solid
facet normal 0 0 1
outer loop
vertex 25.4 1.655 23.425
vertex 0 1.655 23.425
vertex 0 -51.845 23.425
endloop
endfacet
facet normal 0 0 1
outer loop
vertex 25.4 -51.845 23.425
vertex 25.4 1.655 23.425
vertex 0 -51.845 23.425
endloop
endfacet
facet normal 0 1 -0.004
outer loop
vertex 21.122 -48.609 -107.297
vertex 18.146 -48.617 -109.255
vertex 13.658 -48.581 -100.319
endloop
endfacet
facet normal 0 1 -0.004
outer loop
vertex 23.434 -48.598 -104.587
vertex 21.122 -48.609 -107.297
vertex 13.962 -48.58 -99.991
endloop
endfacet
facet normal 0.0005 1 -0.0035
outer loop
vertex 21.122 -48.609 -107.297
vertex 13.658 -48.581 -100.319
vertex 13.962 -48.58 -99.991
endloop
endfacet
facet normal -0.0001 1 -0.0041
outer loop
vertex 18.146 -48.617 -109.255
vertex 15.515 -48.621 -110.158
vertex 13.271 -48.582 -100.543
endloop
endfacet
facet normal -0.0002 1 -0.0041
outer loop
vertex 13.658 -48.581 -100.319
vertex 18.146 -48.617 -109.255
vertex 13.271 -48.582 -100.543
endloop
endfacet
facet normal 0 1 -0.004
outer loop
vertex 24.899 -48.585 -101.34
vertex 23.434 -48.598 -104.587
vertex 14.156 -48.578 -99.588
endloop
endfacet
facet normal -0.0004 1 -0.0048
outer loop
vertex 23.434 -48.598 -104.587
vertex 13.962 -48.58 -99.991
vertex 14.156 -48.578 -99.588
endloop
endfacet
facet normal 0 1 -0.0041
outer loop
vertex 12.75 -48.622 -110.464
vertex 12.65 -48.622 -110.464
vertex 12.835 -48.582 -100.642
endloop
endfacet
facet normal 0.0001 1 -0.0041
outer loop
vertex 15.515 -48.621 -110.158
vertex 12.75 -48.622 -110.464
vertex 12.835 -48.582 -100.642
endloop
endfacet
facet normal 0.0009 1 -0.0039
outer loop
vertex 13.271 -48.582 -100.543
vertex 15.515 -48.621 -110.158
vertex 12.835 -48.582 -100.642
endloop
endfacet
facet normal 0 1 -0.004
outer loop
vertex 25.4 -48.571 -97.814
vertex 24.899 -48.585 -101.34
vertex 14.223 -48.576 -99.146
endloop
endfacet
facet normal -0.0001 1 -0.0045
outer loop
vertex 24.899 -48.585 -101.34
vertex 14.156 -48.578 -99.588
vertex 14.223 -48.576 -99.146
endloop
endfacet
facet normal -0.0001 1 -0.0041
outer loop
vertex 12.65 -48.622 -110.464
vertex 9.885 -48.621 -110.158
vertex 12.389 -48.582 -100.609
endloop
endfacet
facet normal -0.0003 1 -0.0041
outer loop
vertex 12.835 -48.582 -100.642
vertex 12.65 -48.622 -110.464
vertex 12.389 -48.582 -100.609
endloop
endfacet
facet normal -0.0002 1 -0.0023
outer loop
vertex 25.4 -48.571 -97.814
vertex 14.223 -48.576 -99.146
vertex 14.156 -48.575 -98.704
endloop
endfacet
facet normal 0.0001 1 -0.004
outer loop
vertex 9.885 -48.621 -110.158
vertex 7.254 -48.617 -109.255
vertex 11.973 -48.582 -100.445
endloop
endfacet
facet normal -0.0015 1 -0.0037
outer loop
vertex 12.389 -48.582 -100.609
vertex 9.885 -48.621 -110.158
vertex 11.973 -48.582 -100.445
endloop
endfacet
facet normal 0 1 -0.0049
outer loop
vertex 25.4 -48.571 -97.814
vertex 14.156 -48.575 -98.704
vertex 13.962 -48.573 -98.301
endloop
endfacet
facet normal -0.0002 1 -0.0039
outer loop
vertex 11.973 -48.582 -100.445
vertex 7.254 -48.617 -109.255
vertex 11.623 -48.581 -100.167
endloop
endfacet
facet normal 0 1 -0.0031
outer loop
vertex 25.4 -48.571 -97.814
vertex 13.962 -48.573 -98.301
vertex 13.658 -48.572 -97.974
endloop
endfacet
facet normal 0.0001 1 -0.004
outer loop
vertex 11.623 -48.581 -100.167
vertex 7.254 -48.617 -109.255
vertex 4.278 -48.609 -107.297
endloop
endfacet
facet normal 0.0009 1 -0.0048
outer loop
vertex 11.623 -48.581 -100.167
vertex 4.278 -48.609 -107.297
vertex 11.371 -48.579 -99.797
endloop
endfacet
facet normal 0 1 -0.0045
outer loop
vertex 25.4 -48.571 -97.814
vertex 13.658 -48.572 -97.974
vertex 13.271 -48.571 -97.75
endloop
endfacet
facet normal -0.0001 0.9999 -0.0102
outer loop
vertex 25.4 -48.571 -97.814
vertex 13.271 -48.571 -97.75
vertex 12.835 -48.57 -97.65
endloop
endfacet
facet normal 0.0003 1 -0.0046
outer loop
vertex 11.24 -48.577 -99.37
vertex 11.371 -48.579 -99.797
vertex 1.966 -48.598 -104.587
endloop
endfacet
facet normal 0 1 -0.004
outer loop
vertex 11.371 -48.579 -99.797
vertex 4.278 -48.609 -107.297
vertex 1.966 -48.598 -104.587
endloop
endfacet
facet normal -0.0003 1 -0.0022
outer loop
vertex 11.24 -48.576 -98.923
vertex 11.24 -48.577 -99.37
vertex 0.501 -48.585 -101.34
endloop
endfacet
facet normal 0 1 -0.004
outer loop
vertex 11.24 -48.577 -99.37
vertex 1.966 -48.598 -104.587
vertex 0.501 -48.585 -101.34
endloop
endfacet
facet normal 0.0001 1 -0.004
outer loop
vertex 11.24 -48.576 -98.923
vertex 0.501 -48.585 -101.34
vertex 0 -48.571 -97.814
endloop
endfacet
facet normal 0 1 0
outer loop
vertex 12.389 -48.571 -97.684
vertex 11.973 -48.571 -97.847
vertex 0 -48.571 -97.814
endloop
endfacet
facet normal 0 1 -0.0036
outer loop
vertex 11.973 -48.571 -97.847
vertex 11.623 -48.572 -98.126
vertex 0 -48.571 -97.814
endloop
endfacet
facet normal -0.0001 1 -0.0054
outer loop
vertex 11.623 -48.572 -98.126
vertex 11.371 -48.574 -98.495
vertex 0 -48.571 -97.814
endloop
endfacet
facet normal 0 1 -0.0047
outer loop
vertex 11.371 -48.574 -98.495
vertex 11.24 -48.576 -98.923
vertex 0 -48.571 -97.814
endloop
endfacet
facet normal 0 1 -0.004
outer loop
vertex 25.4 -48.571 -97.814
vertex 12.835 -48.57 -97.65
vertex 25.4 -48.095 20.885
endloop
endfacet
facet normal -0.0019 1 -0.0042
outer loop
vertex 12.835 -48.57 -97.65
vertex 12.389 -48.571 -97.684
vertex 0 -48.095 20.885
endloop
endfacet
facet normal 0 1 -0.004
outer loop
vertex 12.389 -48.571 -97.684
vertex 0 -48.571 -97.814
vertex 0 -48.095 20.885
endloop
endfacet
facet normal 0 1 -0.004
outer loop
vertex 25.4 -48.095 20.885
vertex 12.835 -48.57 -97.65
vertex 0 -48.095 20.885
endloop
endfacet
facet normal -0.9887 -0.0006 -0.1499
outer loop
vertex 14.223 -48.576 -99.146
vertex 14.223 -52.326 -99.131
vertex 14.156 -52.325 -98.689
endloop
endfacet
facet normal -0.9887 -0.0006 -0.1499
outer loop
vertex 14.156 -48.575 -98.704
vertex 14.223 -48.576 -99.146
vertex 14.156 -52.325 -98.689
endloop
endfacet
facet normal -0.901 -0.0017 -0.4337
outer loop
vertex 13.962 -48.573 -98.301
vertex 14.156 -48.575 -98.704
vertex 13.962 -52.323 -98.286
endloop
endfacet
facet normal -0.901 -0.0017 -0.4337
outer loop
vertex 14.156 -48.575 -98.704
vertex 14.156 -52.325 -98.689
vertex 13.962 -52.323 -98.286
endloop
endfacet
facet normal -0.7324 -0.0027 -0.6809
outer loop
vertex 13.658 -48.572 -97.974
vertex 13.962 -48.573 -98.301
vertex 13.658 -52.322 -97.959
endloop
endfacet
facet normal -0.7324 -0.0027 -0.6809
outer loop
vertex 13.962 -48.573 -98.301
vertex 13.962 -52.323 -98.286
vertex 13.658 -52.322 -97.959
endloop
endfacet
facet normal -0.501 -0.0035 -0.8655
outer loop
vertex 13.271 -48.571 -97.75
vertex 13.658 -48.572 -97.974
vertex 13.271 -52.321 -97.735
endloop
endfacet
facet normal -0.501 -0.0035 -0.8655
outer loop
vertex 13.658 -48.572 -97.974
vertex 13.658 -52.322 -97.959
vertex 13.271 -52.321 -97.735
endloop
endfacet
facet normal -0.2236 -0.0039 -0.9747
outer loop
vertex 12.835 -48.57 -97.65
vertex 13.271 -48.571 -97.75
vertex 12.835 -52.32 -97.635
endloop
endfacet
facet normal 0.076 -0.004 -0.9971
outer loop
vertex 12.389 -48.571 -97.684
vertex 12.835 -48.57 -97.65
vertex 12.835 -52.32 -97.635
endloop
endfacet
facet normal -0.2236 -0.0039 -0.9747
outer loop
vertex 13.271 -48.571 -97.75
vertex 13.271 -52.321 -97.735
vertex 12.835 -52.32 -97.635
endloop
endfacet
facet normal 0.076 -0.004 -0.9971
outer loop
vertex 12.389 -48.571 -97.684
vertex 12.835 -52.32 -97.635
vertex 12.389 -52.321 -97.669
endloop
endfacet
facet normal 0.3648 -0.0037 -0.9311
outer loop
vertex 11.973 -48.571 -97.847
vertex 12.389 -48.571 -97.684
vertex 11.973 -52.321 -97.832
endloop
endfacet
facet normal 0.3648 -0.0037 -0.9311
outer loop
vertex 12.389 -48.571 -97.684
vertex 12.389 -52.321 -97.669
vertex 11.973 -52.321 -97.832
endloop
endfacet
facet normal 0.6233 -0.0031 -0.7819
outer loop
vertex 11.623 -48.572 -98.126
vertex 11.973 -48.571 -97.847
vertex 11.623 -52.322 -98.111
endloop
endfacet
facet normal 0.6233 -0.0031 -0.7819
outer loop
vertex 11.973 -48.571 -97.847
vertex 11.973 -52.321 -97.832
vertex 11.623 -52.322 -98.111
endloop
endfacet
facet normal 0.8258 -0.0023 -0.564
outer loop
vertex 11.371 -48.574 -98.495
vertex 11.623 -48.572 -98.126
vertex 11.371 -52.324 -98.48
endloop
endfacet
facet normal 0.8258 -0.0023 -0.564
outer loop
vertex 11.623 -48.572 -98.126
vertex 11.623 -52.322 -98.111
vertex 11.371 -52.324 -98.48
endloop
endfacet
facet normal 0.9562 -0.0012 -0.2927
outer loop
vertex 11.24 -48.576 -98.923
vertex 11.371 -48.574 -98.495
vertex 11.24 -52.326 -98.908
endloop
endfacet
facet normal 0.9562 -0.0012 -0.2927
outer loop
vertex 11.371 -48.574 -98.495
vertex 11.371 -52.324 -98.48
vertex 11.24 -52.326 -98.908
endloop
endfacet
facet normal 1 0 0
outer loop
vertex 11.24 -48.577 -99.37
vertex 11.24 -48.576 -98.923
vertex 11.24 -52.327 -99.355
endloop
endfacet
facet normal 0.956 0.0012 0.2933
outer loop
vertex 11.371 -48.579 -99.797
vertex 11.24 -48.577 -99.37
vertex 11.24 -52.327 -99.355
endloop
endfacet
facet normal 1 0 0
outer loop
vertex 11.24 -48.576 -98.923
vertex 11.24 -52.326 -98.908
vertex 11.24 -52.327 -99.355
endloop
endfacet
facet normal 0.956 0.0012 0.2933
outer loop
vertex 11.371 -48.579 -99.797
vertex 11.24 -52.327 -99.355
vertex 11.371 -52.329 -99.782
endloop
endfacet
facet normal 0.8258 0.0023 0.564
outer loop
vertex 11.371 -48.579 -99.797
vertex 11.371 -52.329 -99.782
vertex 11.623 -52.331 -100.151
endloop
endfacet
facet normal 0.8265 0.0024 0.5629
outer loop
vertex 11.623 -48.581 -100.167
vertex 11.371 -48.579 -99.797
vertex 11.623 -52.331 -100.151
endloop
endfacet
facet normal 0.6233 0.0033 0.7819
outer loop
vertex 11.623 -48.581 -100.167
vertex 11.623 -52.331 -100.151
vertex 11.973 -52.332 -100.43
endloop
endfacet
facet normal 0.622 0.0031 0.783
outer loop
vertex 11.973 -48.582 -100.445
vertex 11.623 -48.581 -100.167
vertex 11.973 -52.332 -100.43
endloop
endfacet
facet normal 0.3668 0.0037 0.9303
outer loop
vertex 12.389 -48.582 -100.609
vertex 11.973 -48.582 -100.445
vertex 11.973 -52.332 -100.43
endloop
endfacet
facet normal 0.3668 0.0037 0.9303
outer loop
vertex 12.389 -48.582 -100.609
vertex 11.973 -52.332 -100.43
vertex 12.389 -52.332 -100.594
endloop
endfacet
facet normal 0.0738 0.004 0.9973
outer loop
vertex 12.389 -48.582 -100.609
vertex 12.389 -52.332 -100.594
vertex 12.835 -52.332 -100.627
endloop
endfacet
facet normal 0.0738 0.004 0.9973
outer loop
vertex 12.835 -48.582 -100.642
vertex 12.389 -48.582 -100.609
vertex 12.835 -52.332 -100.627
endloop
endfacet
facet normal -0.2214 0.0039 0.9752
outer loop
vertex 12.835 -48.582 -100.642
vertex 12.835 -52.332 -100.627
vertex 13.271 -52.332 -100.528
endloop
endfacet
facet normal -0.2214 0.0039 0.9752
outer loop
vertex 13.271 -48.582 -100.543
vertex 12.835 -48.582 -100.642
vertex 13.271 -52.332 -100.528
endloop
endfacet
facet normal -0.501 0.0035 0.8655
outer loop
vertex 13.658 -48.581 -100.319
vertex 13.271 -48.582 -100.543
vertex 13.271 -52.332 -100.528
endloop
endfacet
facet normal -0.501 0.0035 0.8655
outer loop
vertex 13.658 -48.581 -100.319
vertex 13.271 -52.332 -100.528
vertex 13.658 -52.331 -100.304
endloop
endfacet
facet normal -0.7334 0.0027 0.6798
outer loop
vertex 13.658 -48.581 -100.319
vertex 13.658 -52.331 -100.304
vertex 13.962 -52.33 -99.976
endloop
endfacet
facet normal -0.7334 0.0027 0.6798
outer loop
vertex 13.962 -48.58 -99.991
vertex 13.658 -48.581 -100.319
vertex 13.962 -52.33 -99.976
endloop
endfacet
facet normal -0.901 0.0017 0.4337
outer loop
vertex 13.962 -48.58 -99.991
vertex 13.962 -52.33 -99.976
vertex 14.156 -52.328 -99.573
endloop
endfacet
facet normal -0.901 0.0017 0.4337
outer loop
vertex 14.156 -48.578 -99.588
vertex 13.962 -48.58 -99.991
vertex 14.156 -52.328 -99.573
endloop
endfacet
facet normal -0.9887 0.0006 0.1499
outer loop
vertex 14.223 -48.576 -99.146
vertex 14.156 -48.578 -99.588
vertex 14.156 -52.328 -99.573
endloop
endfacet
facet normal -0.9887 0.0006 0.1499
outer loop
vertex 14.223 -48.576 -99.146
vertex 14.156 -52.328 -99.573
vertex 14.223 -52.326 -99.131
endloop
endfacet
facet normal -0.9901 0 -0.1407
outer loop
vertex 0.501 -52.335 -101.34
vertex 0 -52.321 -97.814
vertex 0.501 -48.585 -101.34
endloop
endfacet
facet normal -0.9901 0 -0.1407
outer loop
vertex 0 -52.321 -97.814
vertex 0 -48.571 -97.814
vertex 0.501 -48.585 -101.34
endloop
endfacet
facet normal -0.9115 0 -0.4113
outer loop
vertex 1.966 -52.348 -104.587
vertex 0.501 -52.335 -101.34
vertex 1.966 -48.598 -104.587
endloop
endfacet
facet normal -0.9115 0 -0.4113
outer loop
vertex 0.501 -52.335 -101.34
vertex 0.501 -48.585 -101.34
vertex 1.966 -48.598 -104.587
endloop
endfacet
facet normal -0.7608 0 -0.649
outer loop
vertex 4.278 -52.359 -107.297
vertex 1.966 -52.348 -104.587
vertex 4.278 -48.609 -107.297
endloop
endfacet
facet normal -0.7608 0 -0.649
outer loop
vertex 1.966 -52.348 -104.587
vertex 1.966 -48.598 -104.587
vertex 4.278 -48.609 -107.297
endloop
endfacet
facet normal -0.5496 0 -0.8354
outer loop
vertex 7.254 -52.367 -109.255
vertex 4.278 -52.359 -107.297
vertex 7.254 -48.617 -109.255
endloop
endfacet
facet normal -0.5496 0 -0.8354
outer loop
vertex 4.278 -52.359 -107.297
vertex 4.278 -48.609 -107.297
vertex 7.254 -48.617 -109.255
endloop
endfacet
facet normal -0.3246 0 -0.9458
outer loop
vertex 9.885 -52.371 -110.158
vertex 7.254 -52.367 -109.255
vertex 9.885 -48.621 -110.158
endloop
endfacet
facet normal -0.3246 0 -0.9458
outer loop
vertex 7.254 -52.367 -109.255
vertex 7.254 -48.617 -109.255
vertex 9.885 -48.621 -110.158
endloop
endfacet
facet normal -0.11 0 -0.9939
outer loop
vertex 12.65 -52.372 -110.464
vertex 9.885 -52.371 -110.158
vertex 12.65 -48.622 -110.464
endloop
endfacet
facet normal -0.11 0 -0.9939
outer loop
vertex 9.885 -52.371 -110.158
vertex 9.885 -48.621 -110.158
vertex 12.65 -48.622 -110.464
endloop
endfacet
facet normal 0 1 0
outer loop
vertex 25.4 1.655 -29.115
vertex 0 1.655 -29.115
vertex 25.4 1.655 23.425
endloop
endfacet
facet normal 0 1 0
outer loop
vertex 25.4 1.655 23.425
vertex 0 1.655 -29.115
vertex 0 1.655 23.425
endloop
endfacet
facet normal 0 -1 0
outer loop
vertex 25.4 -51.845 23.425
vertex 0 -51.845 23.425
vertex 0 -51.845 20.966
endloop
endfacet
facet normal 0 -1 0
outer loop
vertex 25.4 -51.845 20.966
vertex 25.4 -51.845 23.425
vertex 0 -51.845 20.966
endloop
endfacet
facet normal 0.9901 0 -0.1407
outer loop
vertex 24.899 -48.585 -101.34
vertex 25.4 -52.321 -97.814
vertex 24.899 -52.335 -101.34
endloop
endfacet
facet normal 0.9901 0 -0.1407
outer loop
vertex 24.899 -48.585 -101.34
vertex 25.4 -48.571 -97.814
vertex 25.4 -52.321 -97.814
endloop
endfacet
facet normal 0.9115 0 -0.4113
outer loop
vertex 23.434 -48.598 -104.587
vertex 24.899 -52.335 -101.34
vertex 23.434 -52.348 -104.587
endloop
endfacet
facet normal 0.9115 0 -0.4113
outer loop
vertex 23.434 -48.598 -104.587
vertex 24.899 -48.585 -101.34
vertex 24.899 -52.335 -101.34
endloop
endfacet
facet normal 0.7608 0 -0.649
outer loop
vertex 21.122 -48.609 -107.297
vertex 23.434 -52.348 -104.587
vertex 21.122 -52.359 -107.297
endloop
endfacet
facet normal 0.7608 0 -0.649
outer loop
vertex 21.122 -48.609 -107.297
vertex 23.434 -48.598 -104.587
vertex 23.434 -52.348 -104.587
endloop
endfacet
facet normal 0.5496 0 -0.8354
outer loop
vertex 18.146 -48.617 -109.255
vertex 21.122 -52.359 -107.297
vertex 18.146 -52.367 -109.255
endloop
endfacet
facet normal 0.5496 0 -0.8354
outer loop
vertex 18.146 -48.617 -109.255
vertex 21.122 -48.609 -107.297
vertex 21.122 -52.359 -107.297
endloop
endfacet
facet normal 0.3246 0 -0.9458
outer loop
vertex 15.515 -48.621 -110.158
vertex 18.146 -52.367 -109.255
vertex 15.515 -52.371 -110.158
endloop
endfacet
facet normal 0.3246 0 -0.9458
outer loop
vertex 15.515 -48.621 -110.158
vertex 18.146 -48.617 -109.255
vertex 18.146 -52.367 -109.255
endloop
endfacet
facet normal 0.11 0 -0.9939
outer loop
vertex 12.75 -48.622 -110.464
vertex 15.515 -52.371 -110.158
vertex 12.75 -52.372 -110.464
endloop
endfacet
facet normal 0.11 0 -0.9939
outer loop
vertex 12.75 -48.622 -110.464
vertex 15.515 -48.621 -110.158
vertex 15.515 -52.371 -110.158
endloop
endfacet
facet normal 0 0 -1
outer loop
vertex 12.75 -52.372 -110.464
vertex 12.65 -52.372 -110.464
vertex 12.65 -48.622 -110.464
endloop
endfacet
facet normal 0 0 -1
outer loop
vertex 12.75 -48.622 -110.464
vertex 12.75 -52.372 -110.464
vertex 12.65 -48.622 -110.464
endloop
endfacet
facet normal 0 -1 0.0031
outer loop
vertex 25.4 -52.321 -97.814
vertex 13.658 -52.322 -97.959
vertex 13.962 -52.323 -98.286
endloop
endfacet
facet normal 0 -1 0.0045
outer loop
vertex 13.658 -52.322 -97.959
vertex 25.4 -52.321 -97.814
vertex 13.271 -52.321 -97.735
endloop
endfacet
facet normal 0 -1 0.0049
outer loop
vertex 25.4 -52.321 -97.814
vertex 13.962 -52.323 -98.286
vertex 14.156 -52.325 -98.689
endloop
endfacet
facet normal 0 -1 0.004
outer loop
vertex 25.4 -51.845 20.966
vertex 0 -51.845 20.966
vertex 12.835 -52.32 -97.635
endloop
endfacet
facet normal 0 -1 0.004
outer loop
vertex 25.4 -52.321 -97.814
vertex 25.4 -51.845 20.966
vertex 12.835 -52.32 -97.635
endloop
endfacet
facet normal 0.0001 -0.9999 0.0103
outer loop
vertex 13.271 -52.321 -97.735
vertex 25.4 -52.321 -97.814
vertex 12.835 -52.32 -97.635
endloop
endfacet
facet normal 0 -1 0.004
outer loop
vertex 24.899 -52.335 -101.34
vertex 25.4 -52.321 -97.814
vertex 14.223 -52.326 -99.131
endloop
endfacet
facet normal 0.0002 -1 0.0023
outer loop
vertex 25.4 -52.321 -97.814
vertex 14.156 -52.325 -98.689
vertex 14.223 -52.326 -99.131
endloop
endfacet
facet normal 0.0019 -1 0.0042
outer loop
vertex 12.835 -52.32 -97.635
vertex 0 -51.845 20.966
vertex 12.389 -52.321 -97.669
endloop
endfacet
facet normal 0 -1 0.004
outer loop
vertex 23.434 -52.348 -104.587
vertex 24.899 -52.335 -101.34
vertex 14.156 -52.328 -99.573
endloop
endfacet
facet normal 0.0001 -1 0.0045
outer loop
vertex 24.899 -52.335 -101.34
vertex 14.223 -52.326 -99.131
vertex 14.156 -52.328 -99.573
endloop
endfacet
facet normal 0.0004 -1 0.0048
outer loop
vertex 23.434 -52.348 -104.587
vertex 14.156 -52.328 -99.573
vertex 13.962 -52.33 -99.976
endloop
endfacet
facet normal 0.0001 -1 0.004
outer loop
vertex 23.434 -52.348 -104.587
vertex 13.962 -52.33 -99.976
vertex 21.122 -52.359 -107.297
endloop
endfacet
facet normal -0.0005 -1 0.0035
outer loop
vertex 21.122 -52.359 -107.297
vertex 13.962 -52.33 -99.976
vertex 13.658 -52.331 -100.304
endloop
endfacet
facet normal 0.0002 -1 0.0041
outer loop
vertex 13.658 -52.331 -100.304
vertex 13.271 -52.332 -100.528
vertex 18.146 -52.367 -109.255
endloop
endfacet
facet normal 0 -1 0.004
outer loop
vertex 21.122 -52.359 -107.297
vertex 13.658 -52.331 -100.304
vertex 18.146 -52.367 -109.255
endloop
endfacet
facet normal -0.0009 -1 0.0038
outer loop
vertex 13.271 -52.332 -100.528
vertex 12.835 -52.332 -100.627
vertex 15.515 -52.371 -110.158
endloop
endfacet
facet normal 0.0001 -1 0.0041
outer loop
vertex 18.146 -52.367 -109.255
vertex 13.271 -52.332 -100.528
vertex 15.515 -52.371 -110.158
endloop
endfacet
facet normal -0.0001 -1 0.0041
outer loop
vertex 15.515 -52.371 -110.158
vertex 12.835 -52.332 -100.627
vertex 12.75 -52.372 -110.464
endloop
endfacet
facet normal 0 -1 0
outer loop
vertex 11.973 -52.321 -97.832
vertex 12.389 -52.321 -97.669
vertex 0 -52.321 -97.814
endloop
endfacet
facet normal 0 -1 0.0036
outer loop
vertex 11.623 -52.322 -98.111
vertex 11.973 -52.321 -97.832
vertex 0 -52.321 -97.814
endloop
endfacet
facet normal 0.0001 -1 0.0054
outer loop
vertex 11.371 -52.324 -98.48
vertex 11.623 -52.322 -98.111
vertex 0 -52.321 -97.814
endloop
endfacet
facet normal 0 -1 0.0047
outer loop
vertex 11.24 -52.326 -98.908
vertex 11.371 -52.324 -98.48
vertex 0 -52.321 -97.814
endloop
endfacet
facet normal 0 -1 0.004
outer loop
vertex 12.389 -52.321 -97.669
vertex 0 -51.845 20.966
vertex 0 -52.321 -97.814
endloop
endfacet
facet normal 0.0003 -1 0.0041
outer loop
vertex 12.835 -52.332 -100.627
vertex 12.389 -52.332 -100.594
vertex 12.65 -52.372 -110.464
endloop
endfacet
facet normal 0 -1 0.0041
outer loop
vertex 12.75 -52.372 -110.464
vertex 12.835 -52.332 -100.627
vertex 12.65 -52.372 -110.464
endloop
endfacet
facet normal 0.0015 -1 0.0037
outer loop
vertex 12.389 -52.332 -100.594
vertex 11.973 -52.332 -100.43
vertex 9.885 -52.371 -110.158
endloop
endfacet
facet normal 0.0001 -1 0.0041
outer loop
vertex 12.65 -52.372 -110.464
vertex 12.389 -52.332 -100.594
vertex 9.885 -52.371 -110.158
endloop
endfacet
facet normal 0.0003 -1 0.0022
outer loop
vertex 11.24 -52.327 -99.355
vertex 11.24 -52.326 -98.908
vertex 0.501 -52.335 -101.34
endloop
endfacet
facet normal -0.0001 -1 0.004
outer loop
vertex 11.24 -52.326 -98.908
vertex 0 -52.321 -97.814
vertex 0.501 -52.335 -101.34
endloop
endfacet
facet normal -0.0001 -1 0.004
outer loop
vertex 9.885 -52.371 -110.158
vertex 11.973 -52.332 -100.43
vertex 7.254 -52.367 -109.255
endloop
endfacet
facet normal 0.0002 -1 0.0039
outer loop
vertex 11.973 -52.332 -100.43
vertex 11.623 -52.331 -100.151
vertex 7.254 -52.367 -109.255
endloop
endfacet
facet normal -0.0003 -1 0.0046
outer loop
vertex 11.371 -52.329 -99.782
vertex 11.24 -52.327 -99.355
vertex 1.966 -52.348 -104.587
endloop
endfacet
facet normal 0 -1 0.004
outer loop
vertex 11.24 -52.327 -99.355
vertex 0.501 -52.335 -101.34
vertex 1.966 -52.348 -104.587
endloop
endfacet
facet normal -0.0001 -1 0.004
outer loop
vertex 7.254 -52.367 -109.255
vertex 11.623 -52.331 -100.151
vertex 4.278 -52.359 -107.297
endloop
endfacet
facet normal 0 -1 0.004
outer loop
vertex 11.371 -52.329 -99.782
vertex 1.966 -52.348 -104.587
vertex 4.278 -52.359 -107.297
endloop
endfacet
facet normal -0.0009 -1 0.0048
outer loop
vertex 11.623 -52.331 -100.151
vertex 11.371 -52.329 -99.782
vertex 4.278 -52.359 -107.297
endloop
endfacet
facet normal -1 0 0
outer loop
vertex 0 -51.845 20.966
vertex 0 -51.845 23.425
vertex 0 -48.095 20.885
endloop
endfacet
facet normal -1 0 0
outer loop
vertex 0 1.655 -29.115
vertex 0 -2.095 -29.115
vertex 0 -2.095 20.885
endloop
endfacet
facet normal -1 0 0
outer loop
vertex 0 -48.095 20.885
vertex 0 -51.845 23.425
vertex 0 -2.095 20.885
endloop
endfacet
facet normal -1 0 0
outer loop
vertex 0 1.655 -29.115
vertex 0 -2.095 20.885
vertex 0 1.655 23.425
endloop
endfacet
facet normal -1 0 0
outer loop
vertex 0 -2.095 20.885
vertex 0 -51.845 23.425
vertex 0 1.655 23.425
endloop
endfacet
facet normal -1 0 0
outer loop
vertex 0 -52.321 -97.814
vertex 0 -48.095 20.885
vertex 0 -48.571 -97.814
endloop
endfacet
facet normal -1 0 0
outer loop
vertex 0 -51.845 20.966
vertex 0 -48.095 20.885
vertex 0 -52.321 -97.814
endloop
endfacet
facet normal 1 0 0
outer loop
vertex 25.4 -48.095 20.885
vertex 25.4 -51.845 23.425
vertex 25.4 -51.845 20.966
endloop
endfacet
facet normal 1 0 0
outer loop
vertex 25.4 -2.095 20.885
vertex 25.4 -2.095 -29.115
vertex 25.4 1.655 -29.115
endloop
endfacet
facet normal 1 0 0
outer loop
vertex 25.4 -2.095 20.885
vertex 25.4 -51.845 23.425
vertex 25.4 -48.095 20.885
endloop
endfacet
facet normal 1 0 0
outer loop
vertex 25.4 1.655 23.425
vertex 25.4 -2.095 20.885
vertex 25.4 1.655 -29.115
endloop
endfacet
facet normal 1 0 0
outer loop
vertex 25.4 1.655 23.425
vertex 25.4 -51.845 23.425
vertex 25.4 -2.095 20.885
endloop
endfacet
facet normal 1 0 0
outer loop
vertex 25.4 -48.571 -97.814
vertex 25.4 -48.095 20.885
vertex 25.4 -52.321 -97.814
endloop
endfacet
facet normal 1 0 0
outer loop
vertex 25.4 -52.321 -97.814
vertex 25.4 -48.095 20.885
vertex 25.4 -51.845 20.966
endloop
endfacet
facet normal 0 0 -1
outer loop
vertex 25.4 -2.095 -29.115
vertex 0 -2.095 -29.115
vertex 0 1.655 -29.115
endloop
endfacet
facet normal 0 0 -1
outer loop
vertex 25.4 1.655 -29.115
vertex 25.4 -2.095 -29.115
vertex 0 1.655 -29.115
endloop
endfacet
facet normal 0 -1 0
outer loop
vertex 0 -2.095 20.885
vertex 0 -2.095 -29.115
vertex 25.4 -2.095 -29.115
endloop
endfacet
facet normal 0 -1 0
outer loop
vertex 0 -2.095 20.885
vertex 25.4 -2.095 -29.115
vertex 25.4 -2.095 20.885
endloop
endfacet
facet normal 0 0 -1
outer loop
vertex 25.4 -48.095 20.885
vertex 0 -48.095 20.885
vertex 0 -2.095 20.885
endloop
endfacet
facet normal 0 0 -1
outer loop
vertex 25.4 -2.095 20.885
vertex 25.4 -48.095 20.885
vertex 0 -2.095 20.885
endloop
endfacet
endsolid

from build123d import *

# Parameters (mm, degrees)
F0_W     = 3.75
F0_H     = 50
F1_DEPTH = 25.4
F2_R     = 1.5
F3_DEPTH = 3.75
F4_R     = 12.6501077242


with BuildPart() as f1:
    # F0 (on Right) → F1 (new body)
    with BuildSketch(Plane.YZ):
        Polygon((-51.8451631069, 20.965634957), (-48.095487799, 20.8846080303), (-2.095487799, 20.8846080303), (1.654512201, 20.8846080303), (1.654512201, 23.4246080303), (-51.8451631069, 23.4246080303), align=None)
        Polygon((-48.6218297482, -110.4640364647), (-48.095487799, 20.8846080303), (-51.8451631069, 20.965634957), (-52.3718297482, -110.4640364647), align=None)
        with Locations((-0.220487799, -4.1153919697)):
            Rectangle(F0_W, F0_H)
    extrude(amount=F1_DEPTH)

    # F2 (on face) → F3 (cut)
    with BuildSketch(Plane(origin=(0, -51.9283430119, 0.2080879127), x_dir=(1, 0, 0), z_dir=(0, -0.9999919712, 0.0040071805))):
        with Locations((12.722876047, -99.3401251781)):
            Circle(F2_R)
    extrude(amount=-F3_DEPTH, mode=Mode.SUBTRACT)

    # F4
    f4_edges = [f1.edges().sort_by_distance(p)[0] for p in [
        (25.4, -50.49683, -110.464036),
        (0, -50.49683, -110.464036),
    ]]
    fillet(f4_edges, radius=F4_R)


solid = f1.part
